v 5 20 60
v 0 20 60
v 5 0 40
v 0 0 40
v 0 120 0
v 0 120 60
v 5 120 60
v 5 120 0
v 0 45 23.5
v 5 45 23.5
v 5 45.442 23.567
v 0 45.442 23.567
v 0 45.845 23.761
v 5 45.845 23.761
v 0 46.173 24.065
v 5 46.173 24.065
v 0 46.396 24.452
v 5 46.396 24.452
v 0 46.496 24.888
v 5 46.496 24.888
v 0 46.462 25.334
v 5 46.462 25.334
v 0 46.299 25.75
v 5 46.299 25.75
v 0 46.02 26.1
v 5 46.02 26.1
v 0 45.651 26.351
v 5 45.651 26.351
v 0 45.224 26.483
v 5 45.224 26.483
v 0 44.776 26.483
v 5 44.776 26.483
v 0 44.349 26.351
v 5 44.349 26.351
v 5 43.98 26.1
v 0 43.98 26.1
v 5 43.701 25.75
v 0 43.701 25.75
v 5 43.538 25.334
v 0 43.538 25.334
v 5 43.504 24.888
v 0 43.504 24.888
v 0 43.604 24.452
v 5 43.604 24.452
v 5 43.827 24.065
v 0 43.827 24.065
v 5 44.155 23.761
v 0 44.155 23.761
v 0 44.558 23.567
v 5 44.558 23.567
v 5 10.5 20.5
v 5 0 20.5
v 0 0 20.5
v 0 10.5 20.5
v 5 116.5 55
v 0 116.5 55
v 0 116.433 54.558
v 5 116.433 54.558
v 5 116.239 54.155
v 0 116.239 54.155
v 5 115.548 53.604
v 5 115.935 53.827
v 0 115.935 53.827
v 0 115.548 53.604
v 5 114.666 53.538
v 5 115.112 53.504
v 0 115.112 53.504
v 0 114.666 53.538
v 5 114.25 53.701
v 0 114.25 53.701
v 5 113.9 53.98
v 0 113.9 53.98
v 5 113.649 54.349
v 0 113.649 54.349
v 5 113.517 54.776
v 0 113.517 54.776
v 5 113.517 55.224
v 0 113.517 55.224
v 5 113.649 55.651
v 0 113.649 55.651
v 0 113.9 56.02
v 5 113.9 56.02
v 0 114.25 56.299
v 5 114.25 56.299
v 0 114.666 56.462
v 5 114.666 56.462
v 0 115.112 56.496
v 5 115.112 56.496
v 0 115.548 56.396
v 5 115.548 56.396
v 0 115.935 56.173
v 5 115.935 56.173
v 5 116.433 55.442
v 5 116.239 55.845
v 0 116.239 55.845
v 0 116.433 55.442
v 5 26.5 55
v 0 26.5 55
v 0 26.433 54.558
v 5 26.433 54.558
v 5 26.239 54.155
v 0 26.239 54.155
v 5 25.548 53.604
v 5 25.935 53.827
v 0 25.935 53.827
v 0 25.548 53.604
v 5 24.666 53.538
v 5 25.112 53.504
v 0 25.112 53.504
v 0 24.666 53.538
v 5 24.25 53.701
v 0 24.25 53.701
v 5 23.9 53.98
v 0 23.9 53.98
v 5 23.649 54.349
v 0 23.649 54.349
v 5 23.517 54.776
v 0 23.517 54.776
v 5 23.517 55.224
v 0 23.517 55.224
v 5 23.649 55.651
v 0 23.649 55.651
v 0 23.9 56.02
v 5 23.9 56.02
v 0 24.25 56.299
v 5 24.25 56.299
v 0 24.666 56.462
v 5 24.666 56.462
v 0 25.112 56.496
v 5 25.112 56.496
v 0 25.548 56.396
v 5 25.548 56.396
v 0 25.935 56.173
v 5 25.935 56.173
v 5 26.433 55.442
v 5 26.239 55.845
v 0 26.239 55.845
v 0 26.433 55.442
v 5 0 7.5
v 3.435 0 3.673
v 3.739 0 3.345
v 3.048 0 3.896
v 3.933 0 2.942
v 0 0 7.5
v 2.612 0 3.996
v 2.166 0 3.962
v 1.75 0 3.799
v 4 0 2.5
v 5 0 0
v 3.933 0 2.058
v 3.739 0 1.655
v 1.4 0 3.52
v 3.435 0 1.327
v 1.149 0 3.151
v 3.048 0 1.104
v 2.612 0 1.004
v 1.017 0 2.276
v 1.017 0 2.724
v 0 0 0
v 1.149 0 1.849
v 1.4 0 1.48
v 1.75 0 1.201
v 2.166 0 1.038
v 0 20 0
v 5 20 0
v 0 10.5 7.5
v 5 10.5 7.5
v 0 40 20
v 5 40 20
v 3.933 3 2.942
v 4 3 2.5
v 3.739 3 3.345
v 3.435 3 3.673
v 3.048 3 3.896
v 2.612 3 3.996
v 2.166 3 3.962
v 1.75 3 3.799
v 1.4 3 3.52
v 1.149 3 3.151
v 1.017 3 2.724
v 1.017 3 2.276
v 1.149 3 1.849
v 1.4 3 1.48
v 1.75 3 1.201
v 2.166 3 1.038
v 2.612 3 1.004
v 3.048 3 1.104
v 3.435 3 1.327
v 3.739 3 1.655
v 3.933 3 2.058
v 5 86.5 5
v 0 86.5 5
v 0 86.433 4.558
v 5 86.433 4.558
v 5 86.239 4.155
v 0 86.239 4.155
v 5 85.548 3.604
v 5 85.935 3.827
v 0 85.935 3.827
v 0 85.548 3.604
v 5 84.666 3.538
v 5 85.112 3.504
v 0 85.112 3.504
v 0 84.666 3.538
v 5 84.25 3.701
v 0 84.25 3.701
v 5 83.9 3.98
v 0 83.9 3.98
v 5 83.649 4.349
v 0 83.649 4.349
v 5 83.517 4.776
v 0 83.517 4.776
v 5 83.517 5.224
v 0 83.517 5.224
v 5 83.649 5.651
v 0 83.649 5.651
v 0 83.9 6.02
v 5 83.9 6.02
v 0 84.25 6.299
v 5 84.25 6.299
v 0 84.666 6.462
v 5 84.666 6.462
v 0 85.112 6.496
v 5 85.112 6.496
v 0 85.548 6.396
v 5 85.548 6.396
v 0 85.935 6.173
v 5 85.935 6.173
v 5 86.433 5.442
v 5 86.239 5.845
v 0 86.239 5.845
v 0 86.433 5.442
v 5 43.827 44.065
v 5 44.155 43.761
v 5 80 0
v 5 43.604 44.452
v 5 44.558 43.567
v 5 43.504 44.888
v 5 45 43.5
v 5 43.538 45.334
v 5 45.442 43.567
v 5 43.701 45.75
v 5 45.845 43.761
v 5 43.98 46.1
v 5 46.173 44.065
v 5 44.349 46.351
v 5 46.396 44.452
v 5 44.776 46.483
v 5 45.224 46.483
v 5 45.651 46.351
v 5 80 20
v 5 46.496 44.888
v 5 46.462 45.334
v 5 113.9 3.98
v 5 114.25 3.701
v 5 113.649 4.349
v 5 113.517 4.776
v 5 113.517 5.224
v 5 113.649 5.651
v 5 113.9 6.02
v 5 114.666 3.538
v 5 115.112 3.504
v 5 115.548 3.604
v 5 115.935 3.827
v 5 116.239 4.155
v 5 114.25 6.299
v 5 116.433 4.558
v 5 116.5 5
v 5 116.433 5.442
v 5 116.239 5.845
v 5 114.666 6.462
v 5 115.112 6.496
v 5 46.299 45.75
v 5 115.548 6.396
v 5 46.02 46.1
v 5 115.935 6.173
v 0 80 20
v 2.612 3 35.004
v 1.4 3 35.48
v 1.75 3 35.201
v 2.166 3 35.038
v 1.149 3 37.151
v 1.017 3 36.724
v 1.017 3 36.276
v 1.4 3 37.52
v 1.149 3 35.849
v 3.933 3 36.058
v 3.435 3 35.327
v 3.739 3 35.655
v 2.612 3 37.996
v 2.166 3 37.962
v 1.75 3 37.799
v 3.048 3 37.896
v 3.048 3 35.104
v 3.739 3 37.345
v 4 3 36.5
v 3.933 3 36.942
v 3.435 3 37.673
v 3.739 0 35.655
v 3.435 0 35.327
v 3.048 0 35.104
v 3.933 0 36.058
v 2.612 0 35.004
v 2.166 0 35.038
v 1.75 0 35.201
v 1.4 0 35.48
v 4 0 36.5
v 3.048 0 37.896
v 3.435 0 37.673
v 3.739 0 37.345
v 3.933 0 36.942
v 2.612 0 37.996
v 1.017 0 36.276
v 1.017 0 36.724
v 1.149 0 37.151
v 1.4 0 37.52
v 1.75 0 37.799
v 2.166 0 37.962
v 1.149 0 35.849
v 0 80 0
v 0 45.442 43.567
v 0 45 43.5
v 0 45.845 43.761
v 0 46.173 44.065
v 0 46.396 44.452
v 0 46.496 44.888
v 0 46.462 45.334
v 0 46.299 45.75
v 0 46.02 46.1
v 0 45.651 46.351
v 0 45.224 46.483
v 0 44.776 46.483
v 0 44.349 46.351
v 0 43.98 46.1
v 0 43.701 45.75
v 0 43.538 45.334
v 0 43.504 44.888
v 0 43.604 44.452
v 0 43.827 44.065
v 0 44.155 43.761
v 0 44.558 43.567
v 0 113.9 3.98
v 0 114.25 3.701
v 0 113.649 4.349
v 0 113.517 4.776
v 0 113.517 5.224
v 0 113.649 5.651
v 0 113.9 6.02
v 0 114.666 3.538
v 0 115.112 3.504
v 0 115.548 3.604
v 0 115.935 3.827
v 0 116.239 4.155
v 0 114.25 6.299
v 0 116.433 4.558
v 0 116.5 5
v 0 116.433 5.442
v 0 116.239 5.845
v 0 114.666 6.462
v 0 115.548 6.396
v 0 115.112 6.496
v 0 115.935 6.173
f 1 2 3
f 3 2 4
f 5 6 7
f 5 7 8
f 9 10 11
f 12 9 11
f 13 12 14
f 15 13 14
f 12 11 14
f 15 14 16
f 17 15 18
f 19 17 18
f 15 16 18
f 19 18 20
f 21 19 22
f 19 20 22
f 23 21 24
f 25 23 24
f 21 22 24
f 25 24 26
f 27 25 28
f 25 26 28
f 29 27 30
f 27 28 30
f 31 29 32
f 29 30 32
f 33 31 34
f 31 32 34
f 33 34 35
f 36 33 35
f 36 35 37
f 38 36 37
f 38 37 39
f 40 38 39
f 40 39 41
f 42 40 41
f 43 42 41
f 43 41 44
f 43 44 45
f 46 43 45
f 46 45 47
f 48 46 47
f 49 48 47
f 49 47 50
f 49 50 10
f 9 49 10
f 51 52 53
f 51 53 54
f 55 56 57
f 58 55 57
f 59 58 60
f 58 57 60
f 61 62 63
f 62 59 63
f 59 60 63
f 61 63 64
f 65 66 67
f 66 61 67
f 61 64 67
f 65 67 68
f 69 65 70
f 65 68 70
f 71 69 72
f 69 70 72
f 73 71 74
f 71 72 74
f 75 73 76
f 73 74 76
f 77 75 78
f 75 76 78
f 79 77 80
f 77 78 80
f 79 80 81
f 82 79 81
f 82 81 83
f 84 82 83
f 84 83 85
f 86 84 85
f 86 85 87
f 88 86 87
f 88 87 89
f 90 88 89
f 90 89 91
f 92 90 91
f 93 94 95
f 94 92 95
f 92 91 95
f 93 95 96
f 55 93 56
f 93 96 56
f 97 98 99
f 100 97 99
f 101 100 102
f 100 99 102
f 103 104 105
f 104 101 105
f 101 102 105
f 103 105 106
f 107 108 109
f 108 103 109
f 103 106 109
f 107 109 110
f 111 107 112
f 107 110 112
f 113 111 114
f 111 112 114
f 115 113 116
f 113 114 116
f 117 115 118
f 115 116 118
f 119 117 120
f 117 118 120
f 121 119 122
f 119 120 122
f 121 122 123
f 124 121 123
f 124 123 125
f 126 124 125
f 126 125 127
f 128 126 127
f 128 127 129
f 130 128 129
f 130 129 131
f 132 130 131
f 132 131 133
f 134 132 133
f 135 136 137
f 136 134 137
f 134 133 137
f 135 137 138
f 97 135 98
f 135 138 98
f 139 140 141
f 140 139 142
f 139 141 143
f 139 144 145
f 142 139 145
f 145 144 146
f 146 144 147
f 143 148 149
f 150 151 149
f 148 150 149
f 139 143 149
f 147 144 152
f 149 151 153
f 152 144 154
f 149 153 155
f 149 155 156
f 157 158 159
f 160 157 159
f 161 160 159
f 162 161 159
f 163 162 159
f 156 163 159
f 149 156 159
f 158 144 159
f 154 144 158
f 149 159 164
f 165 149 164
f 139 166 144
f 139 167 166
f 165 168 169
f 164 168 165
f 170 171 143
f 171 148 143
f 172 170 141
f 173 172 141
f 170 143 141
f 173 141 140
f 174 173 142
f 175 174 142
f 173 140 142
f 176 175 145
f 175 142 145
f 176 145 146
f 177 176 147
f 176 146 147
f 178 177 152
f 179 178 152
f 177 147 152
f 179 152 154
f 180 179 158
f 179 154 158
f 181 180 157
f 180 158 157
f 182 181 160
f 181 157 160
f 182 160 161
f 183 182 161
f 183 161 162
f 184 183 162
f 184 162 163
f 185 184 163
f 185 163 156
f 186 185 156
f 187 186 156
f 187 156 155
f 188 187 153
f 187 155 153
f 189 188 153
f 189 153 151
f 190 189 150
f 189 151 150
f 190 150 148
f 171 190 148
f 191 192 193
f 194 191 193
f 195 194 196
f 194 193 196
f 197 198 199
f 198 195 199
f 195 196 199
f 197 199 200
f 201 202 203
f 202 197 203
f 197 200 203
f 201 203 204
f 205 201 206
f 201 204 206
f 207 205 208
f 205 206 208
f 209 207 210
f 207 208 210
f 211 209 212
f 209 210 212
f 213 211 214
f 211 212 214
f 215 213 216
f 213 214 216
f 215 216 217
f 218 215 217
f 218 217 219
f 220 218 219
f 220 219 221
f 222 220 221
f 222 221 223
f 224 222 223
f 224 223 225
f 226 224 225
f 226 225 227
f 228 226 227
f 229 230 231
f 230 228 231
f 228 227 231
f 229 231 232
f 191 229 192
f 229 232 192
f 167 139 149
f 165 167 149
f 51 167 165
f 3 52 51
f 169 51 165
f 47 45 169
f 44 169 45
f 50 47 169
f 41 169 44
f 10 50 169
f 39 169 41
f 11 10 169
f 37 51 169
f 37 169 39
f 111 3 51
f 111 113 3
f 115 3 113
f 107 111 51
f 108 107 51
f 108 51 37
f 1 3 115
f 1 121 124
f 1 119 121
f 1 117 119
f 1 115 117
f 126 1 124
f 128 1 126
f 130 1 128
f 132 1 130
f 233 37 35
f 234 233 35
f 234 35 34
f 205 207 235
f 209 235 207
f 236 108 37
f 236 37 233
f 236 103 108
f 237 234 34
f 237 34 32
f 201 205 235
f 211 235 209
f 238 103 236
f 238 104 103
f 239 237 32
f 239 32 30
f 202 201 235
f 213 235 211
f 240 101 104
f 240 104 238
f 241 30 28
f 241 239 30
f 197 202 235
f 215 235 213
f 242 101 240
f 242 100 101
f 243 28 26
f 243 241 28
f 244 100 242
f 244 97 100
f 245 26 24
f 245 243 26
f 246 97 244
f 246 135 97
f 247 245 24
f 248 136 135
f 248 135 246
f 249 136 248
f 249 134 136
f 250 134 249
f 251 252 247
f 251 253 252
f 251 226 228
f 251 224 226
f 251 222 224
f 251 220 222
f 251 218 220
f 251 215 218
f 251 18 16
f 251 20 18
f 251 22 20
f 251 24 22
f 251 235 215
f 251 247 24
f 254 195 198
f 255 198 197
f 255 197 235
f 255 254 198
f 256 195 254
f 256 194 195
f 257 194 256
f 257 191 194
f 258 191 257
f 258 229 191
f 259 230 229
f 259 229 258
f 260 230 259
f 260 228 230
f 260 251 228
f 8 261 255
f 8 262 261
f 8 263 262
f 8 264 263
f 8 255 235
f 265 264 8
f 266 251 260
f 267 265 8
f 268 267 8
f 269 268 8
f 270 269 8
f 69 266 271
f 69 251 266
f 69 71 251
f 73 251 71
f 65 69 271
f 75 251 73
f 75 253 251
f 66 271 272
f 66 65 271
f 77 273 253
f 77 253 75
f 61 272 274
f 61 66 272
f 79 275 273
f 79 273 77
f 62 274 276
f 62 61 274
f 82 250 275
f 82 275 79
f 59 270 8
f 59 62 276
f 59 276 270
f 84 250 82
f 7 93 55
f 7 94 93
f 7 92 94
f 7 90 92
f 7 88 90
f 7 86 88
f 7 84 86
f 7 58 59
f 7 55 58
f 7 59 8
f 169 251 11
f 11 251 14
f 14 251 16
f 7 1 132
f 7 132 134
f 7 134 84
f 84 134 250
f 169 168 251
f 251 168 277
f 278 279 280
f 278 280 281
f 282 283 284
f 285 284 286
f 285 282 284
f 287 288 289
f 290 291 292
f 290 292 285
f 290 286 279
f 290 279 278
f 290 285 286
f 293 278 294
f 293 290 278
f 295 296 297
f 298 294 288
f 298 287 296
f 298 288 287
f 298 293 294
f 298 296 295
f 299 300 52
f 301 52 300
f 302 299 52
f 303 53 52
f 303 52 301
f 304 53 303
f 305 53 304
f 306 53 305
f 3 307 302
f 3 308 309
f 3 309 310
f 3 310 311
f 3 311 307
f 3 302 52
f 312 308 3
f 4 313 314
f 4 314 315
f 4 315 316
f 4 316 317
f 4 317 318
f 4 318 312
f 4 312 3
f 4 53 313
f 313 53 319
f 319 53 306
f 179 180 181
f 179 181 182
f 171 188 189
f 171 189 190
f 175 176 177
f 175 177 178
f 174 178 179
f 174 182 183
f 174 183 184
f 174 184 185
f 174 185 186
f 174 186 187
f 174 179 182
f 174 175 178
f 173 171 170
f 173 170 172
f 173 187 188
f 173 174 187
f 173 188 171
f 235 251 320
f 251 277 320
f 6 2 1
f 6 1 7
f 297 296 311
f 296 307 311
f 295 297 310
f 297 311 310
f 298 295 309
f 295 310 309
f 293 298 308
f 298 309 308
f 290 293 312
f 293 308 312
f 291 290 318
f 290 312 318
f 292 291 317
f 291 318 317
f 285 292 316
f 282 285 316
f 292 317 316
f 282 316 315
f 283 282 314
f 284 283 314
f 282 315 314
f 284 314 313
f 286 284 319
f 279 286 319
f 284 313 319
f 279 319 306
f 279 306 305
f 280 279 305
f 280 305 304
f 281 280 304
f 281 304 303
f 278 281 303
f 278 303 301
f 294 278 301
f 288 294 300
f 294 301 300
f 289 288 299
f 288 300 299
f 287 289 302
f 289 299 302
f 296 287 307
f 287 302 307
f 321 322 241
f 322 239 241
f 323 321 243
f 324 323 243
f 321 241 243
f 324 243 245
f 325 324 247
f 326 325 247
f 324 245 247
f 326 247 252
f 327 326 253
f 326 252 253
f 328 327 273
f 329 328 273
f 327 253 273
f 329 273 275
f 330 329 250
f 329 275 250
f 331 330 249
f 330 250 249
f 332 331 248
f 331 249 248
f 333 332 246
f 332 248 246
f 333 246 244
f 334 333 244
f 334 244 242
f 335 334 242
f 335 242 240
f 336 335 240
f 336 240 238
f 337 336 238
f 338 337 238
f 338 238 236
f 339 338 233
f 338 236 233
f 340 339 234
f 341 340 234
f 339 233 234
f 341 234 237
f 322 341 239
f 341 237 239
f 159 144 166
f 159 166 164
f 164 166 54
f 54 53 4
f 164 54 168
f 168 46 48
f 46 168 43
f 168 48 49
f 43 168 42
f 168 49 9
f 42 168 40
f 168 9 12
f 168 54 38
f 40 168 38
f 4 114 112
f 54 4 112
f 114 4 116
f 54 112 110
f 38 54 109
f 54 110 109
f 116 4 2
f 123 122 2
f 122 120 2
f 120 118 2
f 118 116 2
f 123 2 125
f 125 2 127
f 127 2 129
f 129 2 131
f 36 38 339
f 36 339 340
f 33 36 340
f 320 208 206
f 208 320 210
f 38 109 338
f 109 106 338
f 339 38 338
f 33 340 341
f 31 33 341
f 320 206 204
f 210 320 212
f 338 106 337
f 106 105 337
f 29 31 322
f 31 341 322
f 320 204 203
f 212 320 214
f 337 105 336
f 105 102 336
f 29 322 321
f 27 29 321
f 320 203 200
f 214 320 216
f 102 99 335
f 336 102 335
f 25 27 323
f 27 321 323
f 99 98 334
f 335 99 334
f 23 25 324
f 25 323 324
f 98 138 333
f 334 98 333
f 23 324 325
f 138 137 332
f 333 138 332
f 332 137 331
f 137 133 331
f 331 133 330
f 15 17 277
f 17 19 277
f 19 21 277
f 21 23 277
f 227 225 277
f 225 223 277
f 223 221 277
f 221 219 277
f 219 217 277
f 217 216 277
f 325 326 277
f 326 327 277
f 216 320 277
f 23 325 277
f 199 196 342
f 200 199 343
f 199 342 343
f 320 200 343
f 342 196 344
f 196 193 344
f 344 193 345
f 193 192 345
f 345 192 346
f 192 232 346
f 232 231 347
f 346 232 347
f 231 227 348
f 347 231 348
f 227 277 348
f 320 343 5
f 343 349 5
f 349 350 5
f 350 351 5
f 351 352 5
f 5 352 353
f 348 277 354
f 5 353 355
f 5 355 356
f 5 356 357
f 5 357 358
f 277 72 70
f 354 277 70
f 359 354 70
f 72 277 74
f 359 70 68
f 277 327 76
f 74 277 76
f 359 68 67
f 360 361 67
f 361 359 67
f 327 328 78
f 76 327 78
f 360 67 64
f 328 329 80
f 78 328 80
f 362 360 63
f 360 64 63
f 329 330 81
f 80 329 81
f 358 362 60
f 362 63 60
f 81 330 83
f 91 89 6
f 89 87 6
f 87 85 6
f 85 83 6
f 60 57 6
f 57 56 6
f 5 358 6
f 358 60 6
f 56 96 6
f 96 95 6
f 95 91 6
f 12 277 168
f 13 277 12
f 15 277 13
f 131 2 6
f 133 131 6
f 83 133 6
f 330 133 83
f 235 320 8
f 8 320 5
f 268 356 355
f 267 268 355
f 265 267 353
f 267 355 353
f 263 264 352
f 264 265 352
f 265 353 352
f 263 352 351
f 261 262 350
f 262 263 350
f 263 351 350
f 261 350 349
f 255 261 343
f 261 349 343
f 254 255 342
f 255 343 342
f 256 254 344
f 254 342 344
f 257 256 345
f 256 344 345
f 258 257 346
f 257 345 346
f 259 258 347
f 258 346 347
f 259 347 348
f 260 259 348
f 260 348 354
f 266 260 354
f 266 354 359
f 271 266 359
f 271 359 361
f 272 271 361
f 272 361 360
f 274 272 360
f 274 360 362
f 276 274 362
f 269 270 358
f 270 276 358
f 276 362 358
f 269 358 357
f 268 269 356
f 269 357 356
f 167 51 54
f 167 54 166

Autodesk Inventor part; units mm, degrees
ref_plane "YZ Plane" through (0, 0, 0) normal (1, 0, 0) x (0, 1, 0)
ref_plane "XZ Plane" through (0, 0, 0) normal (0, 1, 0) x (-1, 0, 0)
ref_plane "XY Plane" through (0, 0, 0) normal (0, 0, 1) x (1, 0, 0)
sketch "Boceto1" plane through (0, 0, 0) normal (1, 0, 0) x (0, 1, 0)
  line L0 (0, 8) -> (10, 8)
  line L1 (10, 8) -> (10, 20)
  line L2 (10, 20) -> (0, 20)
  line L3 (20, 60) -> (0, 40)
  line L4 (0, 0) -> (20, 0)
  line L5 (40, 20) -> (20, 0)
  line L6 (20, 60) -> (40, 60)
  line L7 (0, 20) -> (0, 40)
  line L8 (0, 8) -> (0, 0)
  line L9 (40, 60) -> (120, 60)
  line L10 (120, 60) -> (120, 20)
  line L11 (80, 20) -> (80, 0)
  line L12 (80, 0) -> (120, 0)
  line L13 (120, 0) -> (120, 20)
  line L14 (40, 20) -> (80, 20)
  line L15 (120, 60) -> (115, 60)
  line L16 (120, 55) -> (120, 60)
  line L17 (20, 60) -> (25, 60)
  line L18 (120, 0) -> (115, 0)
  line L19 (120, 5) -> (120, 0)
  line L20 (0, 35) -> (0, 40)
  line L21 (0, 0) -> (5, 0)
  line L22 (0, 5) -> (0, 0)
  circle A0 centre (115, 55) radius 1.5
  circle A1 centre (115, 5) radius 1.5
  circle A2 centre (25, 55) radius 1.5
  circle A3 centre (5, 35) radius 1.5
  circle A4 centre (5, 5) radius 1.5
  line L23 (80, 0) -> (85, 0)
  line L24 (80, 5) -> (80, 0)
  circle A5 centre (85, 5) radius 1.5
  dimension "d2" = 8
  dimension "d3" = 10
  dimension "d4" = 12
  dimension "d5" = 40
  dimension "d7" = 20
  dimension "d11" = 20
  dimension "d12" = 20
  dimension "d13" = 20
  dimension "d16" = 100
  dimension "d17" = 60
  dimension "d18" = 40
  dimension "d27" = 3
  dimension "d28" = 3
  dimension "d29" = 3
  dimension "d30" = 3
  dimension "d31" = 3
  dimension "d34" = 3
  dimension "d35" = 5
  dimension "d36" = 5
  dimension "d37" = 5
  dimension "d38" = 5
  dimension "d39" = 5
  dimension "d40" = 5
  dimension "d41" = 5
  dimension "d42" = 5
  dimension "d43" = 5
  dimension "d44" = 5
  dimension "d45" = 5
  dimension "d46" = 5
extrude "Extrusión1" add sketch "Boceto1" along normal blind 5
sketch "Boceto2" plane through (5, 0, 0) normal (1, 0, 0) x (0, 0, -1)
  point P0 (0, 0)
sketch "Boceto3" plane through (5, 0, 0) normal (1, 0, 0) x (0, 0, -1)
  circle A0 centre (-25, 45) radius 1.5
  line L0 (-20, 40) -> (-20, 80) projected
  circle A1 centre (-45, 45) radius 1.5
  point P0 (0, 0)
  dimension "d49" = 3
  dimension "d50" = 5
  dimension "d51" = 5
  dimension "d52" = 3
  dimension "d53" = 20
  dimension "d54" = 5
extrude "Extrusión2" cut sketch "Boceto3" against normal blind 5
sketch "Boceto4" plane through (0, 0, 20) normal (0, -1, 0) x (1, 0, 0)
  point P0 (0, -20)
sketch "Boceto5" plane through (0, 0, 0) normal (0, -1, 0) x (1, 0, 0)
  circle A0 centre (2.5, 2.5) radius 1.5
  line L0 (0, 0) -> (5, 0) projected
  line L1 (0, 8) -> (0, 0) projected
  dimension "d57" = 3
  dimension "d58" = 2.5
  dimension "d59" = 2.5
extrude "Extrusión3" cut sketch "Boceto5" against normal blind 3
sketch "Boceto6" plane through (5, 0, 0) normal (1, 0, 0) x (0, 0, -1)
  line L0 (-8, 0) -> (0, 0) projected
  line L1 (-20.5, 10.5) -> (-7.5, 10.5)
  line L2 (-7.5, 10.5) -> (-7.5, 0)
  line L3 (-7.5, 0) -> (-20.5, 0)
  line L4 (-20.5, 0) -> (-20.5, 10.5)
  line L5 (-8, 10) -> (-8, 0) projected
  line L6 (-20, 0) -> (-20, 10) projected
  line L7 (-20, 10) -> (-8, 10) projected
  point P0 (-20.5, 5.25)
  dimension "d62" = 0.5
  dimension "d63" = 0.5
  dimension "d64" = 0.5
extrude "Extrusión4" cut sketch "Boceto6" against normal blind 10
sketch "Boceto7" plane through (5, 0, 0) normal (1, 0, 0) x (0, 0, -1)
  point P0 (0, 0)
sketch "Boceto8" plane through (0, 0, 40) normal (0, -1, 0) x (1, 0, 0)
  line L0 (5, -3.5) -> (0, -3.5) projected
  circle A0 centre (2.5, -3.5) radius 1.5
  point P0 (0, -40)
  dimension "d67" = 3
extrude "Extrusión5" cut sketch "Boceto8" against normal blind 3
sketch "Boceto9" plane through (5, 0, 0) normal (1, 0, 0) x (0, 0, -1)
  circle A0 centre (-35, 5) radius 1.5 projected
  circle A1 centre (-35, 5) radius 1.5
  circle A2 centre (-5, 5) radius 1.5 projected
  circle A3 centre (-5, 5) radius 1.5
  point P0 (0, 0)
extrude "Extrusión6" add sketch "Boceto9" against normal blind 5
properties part number "Lateral"
